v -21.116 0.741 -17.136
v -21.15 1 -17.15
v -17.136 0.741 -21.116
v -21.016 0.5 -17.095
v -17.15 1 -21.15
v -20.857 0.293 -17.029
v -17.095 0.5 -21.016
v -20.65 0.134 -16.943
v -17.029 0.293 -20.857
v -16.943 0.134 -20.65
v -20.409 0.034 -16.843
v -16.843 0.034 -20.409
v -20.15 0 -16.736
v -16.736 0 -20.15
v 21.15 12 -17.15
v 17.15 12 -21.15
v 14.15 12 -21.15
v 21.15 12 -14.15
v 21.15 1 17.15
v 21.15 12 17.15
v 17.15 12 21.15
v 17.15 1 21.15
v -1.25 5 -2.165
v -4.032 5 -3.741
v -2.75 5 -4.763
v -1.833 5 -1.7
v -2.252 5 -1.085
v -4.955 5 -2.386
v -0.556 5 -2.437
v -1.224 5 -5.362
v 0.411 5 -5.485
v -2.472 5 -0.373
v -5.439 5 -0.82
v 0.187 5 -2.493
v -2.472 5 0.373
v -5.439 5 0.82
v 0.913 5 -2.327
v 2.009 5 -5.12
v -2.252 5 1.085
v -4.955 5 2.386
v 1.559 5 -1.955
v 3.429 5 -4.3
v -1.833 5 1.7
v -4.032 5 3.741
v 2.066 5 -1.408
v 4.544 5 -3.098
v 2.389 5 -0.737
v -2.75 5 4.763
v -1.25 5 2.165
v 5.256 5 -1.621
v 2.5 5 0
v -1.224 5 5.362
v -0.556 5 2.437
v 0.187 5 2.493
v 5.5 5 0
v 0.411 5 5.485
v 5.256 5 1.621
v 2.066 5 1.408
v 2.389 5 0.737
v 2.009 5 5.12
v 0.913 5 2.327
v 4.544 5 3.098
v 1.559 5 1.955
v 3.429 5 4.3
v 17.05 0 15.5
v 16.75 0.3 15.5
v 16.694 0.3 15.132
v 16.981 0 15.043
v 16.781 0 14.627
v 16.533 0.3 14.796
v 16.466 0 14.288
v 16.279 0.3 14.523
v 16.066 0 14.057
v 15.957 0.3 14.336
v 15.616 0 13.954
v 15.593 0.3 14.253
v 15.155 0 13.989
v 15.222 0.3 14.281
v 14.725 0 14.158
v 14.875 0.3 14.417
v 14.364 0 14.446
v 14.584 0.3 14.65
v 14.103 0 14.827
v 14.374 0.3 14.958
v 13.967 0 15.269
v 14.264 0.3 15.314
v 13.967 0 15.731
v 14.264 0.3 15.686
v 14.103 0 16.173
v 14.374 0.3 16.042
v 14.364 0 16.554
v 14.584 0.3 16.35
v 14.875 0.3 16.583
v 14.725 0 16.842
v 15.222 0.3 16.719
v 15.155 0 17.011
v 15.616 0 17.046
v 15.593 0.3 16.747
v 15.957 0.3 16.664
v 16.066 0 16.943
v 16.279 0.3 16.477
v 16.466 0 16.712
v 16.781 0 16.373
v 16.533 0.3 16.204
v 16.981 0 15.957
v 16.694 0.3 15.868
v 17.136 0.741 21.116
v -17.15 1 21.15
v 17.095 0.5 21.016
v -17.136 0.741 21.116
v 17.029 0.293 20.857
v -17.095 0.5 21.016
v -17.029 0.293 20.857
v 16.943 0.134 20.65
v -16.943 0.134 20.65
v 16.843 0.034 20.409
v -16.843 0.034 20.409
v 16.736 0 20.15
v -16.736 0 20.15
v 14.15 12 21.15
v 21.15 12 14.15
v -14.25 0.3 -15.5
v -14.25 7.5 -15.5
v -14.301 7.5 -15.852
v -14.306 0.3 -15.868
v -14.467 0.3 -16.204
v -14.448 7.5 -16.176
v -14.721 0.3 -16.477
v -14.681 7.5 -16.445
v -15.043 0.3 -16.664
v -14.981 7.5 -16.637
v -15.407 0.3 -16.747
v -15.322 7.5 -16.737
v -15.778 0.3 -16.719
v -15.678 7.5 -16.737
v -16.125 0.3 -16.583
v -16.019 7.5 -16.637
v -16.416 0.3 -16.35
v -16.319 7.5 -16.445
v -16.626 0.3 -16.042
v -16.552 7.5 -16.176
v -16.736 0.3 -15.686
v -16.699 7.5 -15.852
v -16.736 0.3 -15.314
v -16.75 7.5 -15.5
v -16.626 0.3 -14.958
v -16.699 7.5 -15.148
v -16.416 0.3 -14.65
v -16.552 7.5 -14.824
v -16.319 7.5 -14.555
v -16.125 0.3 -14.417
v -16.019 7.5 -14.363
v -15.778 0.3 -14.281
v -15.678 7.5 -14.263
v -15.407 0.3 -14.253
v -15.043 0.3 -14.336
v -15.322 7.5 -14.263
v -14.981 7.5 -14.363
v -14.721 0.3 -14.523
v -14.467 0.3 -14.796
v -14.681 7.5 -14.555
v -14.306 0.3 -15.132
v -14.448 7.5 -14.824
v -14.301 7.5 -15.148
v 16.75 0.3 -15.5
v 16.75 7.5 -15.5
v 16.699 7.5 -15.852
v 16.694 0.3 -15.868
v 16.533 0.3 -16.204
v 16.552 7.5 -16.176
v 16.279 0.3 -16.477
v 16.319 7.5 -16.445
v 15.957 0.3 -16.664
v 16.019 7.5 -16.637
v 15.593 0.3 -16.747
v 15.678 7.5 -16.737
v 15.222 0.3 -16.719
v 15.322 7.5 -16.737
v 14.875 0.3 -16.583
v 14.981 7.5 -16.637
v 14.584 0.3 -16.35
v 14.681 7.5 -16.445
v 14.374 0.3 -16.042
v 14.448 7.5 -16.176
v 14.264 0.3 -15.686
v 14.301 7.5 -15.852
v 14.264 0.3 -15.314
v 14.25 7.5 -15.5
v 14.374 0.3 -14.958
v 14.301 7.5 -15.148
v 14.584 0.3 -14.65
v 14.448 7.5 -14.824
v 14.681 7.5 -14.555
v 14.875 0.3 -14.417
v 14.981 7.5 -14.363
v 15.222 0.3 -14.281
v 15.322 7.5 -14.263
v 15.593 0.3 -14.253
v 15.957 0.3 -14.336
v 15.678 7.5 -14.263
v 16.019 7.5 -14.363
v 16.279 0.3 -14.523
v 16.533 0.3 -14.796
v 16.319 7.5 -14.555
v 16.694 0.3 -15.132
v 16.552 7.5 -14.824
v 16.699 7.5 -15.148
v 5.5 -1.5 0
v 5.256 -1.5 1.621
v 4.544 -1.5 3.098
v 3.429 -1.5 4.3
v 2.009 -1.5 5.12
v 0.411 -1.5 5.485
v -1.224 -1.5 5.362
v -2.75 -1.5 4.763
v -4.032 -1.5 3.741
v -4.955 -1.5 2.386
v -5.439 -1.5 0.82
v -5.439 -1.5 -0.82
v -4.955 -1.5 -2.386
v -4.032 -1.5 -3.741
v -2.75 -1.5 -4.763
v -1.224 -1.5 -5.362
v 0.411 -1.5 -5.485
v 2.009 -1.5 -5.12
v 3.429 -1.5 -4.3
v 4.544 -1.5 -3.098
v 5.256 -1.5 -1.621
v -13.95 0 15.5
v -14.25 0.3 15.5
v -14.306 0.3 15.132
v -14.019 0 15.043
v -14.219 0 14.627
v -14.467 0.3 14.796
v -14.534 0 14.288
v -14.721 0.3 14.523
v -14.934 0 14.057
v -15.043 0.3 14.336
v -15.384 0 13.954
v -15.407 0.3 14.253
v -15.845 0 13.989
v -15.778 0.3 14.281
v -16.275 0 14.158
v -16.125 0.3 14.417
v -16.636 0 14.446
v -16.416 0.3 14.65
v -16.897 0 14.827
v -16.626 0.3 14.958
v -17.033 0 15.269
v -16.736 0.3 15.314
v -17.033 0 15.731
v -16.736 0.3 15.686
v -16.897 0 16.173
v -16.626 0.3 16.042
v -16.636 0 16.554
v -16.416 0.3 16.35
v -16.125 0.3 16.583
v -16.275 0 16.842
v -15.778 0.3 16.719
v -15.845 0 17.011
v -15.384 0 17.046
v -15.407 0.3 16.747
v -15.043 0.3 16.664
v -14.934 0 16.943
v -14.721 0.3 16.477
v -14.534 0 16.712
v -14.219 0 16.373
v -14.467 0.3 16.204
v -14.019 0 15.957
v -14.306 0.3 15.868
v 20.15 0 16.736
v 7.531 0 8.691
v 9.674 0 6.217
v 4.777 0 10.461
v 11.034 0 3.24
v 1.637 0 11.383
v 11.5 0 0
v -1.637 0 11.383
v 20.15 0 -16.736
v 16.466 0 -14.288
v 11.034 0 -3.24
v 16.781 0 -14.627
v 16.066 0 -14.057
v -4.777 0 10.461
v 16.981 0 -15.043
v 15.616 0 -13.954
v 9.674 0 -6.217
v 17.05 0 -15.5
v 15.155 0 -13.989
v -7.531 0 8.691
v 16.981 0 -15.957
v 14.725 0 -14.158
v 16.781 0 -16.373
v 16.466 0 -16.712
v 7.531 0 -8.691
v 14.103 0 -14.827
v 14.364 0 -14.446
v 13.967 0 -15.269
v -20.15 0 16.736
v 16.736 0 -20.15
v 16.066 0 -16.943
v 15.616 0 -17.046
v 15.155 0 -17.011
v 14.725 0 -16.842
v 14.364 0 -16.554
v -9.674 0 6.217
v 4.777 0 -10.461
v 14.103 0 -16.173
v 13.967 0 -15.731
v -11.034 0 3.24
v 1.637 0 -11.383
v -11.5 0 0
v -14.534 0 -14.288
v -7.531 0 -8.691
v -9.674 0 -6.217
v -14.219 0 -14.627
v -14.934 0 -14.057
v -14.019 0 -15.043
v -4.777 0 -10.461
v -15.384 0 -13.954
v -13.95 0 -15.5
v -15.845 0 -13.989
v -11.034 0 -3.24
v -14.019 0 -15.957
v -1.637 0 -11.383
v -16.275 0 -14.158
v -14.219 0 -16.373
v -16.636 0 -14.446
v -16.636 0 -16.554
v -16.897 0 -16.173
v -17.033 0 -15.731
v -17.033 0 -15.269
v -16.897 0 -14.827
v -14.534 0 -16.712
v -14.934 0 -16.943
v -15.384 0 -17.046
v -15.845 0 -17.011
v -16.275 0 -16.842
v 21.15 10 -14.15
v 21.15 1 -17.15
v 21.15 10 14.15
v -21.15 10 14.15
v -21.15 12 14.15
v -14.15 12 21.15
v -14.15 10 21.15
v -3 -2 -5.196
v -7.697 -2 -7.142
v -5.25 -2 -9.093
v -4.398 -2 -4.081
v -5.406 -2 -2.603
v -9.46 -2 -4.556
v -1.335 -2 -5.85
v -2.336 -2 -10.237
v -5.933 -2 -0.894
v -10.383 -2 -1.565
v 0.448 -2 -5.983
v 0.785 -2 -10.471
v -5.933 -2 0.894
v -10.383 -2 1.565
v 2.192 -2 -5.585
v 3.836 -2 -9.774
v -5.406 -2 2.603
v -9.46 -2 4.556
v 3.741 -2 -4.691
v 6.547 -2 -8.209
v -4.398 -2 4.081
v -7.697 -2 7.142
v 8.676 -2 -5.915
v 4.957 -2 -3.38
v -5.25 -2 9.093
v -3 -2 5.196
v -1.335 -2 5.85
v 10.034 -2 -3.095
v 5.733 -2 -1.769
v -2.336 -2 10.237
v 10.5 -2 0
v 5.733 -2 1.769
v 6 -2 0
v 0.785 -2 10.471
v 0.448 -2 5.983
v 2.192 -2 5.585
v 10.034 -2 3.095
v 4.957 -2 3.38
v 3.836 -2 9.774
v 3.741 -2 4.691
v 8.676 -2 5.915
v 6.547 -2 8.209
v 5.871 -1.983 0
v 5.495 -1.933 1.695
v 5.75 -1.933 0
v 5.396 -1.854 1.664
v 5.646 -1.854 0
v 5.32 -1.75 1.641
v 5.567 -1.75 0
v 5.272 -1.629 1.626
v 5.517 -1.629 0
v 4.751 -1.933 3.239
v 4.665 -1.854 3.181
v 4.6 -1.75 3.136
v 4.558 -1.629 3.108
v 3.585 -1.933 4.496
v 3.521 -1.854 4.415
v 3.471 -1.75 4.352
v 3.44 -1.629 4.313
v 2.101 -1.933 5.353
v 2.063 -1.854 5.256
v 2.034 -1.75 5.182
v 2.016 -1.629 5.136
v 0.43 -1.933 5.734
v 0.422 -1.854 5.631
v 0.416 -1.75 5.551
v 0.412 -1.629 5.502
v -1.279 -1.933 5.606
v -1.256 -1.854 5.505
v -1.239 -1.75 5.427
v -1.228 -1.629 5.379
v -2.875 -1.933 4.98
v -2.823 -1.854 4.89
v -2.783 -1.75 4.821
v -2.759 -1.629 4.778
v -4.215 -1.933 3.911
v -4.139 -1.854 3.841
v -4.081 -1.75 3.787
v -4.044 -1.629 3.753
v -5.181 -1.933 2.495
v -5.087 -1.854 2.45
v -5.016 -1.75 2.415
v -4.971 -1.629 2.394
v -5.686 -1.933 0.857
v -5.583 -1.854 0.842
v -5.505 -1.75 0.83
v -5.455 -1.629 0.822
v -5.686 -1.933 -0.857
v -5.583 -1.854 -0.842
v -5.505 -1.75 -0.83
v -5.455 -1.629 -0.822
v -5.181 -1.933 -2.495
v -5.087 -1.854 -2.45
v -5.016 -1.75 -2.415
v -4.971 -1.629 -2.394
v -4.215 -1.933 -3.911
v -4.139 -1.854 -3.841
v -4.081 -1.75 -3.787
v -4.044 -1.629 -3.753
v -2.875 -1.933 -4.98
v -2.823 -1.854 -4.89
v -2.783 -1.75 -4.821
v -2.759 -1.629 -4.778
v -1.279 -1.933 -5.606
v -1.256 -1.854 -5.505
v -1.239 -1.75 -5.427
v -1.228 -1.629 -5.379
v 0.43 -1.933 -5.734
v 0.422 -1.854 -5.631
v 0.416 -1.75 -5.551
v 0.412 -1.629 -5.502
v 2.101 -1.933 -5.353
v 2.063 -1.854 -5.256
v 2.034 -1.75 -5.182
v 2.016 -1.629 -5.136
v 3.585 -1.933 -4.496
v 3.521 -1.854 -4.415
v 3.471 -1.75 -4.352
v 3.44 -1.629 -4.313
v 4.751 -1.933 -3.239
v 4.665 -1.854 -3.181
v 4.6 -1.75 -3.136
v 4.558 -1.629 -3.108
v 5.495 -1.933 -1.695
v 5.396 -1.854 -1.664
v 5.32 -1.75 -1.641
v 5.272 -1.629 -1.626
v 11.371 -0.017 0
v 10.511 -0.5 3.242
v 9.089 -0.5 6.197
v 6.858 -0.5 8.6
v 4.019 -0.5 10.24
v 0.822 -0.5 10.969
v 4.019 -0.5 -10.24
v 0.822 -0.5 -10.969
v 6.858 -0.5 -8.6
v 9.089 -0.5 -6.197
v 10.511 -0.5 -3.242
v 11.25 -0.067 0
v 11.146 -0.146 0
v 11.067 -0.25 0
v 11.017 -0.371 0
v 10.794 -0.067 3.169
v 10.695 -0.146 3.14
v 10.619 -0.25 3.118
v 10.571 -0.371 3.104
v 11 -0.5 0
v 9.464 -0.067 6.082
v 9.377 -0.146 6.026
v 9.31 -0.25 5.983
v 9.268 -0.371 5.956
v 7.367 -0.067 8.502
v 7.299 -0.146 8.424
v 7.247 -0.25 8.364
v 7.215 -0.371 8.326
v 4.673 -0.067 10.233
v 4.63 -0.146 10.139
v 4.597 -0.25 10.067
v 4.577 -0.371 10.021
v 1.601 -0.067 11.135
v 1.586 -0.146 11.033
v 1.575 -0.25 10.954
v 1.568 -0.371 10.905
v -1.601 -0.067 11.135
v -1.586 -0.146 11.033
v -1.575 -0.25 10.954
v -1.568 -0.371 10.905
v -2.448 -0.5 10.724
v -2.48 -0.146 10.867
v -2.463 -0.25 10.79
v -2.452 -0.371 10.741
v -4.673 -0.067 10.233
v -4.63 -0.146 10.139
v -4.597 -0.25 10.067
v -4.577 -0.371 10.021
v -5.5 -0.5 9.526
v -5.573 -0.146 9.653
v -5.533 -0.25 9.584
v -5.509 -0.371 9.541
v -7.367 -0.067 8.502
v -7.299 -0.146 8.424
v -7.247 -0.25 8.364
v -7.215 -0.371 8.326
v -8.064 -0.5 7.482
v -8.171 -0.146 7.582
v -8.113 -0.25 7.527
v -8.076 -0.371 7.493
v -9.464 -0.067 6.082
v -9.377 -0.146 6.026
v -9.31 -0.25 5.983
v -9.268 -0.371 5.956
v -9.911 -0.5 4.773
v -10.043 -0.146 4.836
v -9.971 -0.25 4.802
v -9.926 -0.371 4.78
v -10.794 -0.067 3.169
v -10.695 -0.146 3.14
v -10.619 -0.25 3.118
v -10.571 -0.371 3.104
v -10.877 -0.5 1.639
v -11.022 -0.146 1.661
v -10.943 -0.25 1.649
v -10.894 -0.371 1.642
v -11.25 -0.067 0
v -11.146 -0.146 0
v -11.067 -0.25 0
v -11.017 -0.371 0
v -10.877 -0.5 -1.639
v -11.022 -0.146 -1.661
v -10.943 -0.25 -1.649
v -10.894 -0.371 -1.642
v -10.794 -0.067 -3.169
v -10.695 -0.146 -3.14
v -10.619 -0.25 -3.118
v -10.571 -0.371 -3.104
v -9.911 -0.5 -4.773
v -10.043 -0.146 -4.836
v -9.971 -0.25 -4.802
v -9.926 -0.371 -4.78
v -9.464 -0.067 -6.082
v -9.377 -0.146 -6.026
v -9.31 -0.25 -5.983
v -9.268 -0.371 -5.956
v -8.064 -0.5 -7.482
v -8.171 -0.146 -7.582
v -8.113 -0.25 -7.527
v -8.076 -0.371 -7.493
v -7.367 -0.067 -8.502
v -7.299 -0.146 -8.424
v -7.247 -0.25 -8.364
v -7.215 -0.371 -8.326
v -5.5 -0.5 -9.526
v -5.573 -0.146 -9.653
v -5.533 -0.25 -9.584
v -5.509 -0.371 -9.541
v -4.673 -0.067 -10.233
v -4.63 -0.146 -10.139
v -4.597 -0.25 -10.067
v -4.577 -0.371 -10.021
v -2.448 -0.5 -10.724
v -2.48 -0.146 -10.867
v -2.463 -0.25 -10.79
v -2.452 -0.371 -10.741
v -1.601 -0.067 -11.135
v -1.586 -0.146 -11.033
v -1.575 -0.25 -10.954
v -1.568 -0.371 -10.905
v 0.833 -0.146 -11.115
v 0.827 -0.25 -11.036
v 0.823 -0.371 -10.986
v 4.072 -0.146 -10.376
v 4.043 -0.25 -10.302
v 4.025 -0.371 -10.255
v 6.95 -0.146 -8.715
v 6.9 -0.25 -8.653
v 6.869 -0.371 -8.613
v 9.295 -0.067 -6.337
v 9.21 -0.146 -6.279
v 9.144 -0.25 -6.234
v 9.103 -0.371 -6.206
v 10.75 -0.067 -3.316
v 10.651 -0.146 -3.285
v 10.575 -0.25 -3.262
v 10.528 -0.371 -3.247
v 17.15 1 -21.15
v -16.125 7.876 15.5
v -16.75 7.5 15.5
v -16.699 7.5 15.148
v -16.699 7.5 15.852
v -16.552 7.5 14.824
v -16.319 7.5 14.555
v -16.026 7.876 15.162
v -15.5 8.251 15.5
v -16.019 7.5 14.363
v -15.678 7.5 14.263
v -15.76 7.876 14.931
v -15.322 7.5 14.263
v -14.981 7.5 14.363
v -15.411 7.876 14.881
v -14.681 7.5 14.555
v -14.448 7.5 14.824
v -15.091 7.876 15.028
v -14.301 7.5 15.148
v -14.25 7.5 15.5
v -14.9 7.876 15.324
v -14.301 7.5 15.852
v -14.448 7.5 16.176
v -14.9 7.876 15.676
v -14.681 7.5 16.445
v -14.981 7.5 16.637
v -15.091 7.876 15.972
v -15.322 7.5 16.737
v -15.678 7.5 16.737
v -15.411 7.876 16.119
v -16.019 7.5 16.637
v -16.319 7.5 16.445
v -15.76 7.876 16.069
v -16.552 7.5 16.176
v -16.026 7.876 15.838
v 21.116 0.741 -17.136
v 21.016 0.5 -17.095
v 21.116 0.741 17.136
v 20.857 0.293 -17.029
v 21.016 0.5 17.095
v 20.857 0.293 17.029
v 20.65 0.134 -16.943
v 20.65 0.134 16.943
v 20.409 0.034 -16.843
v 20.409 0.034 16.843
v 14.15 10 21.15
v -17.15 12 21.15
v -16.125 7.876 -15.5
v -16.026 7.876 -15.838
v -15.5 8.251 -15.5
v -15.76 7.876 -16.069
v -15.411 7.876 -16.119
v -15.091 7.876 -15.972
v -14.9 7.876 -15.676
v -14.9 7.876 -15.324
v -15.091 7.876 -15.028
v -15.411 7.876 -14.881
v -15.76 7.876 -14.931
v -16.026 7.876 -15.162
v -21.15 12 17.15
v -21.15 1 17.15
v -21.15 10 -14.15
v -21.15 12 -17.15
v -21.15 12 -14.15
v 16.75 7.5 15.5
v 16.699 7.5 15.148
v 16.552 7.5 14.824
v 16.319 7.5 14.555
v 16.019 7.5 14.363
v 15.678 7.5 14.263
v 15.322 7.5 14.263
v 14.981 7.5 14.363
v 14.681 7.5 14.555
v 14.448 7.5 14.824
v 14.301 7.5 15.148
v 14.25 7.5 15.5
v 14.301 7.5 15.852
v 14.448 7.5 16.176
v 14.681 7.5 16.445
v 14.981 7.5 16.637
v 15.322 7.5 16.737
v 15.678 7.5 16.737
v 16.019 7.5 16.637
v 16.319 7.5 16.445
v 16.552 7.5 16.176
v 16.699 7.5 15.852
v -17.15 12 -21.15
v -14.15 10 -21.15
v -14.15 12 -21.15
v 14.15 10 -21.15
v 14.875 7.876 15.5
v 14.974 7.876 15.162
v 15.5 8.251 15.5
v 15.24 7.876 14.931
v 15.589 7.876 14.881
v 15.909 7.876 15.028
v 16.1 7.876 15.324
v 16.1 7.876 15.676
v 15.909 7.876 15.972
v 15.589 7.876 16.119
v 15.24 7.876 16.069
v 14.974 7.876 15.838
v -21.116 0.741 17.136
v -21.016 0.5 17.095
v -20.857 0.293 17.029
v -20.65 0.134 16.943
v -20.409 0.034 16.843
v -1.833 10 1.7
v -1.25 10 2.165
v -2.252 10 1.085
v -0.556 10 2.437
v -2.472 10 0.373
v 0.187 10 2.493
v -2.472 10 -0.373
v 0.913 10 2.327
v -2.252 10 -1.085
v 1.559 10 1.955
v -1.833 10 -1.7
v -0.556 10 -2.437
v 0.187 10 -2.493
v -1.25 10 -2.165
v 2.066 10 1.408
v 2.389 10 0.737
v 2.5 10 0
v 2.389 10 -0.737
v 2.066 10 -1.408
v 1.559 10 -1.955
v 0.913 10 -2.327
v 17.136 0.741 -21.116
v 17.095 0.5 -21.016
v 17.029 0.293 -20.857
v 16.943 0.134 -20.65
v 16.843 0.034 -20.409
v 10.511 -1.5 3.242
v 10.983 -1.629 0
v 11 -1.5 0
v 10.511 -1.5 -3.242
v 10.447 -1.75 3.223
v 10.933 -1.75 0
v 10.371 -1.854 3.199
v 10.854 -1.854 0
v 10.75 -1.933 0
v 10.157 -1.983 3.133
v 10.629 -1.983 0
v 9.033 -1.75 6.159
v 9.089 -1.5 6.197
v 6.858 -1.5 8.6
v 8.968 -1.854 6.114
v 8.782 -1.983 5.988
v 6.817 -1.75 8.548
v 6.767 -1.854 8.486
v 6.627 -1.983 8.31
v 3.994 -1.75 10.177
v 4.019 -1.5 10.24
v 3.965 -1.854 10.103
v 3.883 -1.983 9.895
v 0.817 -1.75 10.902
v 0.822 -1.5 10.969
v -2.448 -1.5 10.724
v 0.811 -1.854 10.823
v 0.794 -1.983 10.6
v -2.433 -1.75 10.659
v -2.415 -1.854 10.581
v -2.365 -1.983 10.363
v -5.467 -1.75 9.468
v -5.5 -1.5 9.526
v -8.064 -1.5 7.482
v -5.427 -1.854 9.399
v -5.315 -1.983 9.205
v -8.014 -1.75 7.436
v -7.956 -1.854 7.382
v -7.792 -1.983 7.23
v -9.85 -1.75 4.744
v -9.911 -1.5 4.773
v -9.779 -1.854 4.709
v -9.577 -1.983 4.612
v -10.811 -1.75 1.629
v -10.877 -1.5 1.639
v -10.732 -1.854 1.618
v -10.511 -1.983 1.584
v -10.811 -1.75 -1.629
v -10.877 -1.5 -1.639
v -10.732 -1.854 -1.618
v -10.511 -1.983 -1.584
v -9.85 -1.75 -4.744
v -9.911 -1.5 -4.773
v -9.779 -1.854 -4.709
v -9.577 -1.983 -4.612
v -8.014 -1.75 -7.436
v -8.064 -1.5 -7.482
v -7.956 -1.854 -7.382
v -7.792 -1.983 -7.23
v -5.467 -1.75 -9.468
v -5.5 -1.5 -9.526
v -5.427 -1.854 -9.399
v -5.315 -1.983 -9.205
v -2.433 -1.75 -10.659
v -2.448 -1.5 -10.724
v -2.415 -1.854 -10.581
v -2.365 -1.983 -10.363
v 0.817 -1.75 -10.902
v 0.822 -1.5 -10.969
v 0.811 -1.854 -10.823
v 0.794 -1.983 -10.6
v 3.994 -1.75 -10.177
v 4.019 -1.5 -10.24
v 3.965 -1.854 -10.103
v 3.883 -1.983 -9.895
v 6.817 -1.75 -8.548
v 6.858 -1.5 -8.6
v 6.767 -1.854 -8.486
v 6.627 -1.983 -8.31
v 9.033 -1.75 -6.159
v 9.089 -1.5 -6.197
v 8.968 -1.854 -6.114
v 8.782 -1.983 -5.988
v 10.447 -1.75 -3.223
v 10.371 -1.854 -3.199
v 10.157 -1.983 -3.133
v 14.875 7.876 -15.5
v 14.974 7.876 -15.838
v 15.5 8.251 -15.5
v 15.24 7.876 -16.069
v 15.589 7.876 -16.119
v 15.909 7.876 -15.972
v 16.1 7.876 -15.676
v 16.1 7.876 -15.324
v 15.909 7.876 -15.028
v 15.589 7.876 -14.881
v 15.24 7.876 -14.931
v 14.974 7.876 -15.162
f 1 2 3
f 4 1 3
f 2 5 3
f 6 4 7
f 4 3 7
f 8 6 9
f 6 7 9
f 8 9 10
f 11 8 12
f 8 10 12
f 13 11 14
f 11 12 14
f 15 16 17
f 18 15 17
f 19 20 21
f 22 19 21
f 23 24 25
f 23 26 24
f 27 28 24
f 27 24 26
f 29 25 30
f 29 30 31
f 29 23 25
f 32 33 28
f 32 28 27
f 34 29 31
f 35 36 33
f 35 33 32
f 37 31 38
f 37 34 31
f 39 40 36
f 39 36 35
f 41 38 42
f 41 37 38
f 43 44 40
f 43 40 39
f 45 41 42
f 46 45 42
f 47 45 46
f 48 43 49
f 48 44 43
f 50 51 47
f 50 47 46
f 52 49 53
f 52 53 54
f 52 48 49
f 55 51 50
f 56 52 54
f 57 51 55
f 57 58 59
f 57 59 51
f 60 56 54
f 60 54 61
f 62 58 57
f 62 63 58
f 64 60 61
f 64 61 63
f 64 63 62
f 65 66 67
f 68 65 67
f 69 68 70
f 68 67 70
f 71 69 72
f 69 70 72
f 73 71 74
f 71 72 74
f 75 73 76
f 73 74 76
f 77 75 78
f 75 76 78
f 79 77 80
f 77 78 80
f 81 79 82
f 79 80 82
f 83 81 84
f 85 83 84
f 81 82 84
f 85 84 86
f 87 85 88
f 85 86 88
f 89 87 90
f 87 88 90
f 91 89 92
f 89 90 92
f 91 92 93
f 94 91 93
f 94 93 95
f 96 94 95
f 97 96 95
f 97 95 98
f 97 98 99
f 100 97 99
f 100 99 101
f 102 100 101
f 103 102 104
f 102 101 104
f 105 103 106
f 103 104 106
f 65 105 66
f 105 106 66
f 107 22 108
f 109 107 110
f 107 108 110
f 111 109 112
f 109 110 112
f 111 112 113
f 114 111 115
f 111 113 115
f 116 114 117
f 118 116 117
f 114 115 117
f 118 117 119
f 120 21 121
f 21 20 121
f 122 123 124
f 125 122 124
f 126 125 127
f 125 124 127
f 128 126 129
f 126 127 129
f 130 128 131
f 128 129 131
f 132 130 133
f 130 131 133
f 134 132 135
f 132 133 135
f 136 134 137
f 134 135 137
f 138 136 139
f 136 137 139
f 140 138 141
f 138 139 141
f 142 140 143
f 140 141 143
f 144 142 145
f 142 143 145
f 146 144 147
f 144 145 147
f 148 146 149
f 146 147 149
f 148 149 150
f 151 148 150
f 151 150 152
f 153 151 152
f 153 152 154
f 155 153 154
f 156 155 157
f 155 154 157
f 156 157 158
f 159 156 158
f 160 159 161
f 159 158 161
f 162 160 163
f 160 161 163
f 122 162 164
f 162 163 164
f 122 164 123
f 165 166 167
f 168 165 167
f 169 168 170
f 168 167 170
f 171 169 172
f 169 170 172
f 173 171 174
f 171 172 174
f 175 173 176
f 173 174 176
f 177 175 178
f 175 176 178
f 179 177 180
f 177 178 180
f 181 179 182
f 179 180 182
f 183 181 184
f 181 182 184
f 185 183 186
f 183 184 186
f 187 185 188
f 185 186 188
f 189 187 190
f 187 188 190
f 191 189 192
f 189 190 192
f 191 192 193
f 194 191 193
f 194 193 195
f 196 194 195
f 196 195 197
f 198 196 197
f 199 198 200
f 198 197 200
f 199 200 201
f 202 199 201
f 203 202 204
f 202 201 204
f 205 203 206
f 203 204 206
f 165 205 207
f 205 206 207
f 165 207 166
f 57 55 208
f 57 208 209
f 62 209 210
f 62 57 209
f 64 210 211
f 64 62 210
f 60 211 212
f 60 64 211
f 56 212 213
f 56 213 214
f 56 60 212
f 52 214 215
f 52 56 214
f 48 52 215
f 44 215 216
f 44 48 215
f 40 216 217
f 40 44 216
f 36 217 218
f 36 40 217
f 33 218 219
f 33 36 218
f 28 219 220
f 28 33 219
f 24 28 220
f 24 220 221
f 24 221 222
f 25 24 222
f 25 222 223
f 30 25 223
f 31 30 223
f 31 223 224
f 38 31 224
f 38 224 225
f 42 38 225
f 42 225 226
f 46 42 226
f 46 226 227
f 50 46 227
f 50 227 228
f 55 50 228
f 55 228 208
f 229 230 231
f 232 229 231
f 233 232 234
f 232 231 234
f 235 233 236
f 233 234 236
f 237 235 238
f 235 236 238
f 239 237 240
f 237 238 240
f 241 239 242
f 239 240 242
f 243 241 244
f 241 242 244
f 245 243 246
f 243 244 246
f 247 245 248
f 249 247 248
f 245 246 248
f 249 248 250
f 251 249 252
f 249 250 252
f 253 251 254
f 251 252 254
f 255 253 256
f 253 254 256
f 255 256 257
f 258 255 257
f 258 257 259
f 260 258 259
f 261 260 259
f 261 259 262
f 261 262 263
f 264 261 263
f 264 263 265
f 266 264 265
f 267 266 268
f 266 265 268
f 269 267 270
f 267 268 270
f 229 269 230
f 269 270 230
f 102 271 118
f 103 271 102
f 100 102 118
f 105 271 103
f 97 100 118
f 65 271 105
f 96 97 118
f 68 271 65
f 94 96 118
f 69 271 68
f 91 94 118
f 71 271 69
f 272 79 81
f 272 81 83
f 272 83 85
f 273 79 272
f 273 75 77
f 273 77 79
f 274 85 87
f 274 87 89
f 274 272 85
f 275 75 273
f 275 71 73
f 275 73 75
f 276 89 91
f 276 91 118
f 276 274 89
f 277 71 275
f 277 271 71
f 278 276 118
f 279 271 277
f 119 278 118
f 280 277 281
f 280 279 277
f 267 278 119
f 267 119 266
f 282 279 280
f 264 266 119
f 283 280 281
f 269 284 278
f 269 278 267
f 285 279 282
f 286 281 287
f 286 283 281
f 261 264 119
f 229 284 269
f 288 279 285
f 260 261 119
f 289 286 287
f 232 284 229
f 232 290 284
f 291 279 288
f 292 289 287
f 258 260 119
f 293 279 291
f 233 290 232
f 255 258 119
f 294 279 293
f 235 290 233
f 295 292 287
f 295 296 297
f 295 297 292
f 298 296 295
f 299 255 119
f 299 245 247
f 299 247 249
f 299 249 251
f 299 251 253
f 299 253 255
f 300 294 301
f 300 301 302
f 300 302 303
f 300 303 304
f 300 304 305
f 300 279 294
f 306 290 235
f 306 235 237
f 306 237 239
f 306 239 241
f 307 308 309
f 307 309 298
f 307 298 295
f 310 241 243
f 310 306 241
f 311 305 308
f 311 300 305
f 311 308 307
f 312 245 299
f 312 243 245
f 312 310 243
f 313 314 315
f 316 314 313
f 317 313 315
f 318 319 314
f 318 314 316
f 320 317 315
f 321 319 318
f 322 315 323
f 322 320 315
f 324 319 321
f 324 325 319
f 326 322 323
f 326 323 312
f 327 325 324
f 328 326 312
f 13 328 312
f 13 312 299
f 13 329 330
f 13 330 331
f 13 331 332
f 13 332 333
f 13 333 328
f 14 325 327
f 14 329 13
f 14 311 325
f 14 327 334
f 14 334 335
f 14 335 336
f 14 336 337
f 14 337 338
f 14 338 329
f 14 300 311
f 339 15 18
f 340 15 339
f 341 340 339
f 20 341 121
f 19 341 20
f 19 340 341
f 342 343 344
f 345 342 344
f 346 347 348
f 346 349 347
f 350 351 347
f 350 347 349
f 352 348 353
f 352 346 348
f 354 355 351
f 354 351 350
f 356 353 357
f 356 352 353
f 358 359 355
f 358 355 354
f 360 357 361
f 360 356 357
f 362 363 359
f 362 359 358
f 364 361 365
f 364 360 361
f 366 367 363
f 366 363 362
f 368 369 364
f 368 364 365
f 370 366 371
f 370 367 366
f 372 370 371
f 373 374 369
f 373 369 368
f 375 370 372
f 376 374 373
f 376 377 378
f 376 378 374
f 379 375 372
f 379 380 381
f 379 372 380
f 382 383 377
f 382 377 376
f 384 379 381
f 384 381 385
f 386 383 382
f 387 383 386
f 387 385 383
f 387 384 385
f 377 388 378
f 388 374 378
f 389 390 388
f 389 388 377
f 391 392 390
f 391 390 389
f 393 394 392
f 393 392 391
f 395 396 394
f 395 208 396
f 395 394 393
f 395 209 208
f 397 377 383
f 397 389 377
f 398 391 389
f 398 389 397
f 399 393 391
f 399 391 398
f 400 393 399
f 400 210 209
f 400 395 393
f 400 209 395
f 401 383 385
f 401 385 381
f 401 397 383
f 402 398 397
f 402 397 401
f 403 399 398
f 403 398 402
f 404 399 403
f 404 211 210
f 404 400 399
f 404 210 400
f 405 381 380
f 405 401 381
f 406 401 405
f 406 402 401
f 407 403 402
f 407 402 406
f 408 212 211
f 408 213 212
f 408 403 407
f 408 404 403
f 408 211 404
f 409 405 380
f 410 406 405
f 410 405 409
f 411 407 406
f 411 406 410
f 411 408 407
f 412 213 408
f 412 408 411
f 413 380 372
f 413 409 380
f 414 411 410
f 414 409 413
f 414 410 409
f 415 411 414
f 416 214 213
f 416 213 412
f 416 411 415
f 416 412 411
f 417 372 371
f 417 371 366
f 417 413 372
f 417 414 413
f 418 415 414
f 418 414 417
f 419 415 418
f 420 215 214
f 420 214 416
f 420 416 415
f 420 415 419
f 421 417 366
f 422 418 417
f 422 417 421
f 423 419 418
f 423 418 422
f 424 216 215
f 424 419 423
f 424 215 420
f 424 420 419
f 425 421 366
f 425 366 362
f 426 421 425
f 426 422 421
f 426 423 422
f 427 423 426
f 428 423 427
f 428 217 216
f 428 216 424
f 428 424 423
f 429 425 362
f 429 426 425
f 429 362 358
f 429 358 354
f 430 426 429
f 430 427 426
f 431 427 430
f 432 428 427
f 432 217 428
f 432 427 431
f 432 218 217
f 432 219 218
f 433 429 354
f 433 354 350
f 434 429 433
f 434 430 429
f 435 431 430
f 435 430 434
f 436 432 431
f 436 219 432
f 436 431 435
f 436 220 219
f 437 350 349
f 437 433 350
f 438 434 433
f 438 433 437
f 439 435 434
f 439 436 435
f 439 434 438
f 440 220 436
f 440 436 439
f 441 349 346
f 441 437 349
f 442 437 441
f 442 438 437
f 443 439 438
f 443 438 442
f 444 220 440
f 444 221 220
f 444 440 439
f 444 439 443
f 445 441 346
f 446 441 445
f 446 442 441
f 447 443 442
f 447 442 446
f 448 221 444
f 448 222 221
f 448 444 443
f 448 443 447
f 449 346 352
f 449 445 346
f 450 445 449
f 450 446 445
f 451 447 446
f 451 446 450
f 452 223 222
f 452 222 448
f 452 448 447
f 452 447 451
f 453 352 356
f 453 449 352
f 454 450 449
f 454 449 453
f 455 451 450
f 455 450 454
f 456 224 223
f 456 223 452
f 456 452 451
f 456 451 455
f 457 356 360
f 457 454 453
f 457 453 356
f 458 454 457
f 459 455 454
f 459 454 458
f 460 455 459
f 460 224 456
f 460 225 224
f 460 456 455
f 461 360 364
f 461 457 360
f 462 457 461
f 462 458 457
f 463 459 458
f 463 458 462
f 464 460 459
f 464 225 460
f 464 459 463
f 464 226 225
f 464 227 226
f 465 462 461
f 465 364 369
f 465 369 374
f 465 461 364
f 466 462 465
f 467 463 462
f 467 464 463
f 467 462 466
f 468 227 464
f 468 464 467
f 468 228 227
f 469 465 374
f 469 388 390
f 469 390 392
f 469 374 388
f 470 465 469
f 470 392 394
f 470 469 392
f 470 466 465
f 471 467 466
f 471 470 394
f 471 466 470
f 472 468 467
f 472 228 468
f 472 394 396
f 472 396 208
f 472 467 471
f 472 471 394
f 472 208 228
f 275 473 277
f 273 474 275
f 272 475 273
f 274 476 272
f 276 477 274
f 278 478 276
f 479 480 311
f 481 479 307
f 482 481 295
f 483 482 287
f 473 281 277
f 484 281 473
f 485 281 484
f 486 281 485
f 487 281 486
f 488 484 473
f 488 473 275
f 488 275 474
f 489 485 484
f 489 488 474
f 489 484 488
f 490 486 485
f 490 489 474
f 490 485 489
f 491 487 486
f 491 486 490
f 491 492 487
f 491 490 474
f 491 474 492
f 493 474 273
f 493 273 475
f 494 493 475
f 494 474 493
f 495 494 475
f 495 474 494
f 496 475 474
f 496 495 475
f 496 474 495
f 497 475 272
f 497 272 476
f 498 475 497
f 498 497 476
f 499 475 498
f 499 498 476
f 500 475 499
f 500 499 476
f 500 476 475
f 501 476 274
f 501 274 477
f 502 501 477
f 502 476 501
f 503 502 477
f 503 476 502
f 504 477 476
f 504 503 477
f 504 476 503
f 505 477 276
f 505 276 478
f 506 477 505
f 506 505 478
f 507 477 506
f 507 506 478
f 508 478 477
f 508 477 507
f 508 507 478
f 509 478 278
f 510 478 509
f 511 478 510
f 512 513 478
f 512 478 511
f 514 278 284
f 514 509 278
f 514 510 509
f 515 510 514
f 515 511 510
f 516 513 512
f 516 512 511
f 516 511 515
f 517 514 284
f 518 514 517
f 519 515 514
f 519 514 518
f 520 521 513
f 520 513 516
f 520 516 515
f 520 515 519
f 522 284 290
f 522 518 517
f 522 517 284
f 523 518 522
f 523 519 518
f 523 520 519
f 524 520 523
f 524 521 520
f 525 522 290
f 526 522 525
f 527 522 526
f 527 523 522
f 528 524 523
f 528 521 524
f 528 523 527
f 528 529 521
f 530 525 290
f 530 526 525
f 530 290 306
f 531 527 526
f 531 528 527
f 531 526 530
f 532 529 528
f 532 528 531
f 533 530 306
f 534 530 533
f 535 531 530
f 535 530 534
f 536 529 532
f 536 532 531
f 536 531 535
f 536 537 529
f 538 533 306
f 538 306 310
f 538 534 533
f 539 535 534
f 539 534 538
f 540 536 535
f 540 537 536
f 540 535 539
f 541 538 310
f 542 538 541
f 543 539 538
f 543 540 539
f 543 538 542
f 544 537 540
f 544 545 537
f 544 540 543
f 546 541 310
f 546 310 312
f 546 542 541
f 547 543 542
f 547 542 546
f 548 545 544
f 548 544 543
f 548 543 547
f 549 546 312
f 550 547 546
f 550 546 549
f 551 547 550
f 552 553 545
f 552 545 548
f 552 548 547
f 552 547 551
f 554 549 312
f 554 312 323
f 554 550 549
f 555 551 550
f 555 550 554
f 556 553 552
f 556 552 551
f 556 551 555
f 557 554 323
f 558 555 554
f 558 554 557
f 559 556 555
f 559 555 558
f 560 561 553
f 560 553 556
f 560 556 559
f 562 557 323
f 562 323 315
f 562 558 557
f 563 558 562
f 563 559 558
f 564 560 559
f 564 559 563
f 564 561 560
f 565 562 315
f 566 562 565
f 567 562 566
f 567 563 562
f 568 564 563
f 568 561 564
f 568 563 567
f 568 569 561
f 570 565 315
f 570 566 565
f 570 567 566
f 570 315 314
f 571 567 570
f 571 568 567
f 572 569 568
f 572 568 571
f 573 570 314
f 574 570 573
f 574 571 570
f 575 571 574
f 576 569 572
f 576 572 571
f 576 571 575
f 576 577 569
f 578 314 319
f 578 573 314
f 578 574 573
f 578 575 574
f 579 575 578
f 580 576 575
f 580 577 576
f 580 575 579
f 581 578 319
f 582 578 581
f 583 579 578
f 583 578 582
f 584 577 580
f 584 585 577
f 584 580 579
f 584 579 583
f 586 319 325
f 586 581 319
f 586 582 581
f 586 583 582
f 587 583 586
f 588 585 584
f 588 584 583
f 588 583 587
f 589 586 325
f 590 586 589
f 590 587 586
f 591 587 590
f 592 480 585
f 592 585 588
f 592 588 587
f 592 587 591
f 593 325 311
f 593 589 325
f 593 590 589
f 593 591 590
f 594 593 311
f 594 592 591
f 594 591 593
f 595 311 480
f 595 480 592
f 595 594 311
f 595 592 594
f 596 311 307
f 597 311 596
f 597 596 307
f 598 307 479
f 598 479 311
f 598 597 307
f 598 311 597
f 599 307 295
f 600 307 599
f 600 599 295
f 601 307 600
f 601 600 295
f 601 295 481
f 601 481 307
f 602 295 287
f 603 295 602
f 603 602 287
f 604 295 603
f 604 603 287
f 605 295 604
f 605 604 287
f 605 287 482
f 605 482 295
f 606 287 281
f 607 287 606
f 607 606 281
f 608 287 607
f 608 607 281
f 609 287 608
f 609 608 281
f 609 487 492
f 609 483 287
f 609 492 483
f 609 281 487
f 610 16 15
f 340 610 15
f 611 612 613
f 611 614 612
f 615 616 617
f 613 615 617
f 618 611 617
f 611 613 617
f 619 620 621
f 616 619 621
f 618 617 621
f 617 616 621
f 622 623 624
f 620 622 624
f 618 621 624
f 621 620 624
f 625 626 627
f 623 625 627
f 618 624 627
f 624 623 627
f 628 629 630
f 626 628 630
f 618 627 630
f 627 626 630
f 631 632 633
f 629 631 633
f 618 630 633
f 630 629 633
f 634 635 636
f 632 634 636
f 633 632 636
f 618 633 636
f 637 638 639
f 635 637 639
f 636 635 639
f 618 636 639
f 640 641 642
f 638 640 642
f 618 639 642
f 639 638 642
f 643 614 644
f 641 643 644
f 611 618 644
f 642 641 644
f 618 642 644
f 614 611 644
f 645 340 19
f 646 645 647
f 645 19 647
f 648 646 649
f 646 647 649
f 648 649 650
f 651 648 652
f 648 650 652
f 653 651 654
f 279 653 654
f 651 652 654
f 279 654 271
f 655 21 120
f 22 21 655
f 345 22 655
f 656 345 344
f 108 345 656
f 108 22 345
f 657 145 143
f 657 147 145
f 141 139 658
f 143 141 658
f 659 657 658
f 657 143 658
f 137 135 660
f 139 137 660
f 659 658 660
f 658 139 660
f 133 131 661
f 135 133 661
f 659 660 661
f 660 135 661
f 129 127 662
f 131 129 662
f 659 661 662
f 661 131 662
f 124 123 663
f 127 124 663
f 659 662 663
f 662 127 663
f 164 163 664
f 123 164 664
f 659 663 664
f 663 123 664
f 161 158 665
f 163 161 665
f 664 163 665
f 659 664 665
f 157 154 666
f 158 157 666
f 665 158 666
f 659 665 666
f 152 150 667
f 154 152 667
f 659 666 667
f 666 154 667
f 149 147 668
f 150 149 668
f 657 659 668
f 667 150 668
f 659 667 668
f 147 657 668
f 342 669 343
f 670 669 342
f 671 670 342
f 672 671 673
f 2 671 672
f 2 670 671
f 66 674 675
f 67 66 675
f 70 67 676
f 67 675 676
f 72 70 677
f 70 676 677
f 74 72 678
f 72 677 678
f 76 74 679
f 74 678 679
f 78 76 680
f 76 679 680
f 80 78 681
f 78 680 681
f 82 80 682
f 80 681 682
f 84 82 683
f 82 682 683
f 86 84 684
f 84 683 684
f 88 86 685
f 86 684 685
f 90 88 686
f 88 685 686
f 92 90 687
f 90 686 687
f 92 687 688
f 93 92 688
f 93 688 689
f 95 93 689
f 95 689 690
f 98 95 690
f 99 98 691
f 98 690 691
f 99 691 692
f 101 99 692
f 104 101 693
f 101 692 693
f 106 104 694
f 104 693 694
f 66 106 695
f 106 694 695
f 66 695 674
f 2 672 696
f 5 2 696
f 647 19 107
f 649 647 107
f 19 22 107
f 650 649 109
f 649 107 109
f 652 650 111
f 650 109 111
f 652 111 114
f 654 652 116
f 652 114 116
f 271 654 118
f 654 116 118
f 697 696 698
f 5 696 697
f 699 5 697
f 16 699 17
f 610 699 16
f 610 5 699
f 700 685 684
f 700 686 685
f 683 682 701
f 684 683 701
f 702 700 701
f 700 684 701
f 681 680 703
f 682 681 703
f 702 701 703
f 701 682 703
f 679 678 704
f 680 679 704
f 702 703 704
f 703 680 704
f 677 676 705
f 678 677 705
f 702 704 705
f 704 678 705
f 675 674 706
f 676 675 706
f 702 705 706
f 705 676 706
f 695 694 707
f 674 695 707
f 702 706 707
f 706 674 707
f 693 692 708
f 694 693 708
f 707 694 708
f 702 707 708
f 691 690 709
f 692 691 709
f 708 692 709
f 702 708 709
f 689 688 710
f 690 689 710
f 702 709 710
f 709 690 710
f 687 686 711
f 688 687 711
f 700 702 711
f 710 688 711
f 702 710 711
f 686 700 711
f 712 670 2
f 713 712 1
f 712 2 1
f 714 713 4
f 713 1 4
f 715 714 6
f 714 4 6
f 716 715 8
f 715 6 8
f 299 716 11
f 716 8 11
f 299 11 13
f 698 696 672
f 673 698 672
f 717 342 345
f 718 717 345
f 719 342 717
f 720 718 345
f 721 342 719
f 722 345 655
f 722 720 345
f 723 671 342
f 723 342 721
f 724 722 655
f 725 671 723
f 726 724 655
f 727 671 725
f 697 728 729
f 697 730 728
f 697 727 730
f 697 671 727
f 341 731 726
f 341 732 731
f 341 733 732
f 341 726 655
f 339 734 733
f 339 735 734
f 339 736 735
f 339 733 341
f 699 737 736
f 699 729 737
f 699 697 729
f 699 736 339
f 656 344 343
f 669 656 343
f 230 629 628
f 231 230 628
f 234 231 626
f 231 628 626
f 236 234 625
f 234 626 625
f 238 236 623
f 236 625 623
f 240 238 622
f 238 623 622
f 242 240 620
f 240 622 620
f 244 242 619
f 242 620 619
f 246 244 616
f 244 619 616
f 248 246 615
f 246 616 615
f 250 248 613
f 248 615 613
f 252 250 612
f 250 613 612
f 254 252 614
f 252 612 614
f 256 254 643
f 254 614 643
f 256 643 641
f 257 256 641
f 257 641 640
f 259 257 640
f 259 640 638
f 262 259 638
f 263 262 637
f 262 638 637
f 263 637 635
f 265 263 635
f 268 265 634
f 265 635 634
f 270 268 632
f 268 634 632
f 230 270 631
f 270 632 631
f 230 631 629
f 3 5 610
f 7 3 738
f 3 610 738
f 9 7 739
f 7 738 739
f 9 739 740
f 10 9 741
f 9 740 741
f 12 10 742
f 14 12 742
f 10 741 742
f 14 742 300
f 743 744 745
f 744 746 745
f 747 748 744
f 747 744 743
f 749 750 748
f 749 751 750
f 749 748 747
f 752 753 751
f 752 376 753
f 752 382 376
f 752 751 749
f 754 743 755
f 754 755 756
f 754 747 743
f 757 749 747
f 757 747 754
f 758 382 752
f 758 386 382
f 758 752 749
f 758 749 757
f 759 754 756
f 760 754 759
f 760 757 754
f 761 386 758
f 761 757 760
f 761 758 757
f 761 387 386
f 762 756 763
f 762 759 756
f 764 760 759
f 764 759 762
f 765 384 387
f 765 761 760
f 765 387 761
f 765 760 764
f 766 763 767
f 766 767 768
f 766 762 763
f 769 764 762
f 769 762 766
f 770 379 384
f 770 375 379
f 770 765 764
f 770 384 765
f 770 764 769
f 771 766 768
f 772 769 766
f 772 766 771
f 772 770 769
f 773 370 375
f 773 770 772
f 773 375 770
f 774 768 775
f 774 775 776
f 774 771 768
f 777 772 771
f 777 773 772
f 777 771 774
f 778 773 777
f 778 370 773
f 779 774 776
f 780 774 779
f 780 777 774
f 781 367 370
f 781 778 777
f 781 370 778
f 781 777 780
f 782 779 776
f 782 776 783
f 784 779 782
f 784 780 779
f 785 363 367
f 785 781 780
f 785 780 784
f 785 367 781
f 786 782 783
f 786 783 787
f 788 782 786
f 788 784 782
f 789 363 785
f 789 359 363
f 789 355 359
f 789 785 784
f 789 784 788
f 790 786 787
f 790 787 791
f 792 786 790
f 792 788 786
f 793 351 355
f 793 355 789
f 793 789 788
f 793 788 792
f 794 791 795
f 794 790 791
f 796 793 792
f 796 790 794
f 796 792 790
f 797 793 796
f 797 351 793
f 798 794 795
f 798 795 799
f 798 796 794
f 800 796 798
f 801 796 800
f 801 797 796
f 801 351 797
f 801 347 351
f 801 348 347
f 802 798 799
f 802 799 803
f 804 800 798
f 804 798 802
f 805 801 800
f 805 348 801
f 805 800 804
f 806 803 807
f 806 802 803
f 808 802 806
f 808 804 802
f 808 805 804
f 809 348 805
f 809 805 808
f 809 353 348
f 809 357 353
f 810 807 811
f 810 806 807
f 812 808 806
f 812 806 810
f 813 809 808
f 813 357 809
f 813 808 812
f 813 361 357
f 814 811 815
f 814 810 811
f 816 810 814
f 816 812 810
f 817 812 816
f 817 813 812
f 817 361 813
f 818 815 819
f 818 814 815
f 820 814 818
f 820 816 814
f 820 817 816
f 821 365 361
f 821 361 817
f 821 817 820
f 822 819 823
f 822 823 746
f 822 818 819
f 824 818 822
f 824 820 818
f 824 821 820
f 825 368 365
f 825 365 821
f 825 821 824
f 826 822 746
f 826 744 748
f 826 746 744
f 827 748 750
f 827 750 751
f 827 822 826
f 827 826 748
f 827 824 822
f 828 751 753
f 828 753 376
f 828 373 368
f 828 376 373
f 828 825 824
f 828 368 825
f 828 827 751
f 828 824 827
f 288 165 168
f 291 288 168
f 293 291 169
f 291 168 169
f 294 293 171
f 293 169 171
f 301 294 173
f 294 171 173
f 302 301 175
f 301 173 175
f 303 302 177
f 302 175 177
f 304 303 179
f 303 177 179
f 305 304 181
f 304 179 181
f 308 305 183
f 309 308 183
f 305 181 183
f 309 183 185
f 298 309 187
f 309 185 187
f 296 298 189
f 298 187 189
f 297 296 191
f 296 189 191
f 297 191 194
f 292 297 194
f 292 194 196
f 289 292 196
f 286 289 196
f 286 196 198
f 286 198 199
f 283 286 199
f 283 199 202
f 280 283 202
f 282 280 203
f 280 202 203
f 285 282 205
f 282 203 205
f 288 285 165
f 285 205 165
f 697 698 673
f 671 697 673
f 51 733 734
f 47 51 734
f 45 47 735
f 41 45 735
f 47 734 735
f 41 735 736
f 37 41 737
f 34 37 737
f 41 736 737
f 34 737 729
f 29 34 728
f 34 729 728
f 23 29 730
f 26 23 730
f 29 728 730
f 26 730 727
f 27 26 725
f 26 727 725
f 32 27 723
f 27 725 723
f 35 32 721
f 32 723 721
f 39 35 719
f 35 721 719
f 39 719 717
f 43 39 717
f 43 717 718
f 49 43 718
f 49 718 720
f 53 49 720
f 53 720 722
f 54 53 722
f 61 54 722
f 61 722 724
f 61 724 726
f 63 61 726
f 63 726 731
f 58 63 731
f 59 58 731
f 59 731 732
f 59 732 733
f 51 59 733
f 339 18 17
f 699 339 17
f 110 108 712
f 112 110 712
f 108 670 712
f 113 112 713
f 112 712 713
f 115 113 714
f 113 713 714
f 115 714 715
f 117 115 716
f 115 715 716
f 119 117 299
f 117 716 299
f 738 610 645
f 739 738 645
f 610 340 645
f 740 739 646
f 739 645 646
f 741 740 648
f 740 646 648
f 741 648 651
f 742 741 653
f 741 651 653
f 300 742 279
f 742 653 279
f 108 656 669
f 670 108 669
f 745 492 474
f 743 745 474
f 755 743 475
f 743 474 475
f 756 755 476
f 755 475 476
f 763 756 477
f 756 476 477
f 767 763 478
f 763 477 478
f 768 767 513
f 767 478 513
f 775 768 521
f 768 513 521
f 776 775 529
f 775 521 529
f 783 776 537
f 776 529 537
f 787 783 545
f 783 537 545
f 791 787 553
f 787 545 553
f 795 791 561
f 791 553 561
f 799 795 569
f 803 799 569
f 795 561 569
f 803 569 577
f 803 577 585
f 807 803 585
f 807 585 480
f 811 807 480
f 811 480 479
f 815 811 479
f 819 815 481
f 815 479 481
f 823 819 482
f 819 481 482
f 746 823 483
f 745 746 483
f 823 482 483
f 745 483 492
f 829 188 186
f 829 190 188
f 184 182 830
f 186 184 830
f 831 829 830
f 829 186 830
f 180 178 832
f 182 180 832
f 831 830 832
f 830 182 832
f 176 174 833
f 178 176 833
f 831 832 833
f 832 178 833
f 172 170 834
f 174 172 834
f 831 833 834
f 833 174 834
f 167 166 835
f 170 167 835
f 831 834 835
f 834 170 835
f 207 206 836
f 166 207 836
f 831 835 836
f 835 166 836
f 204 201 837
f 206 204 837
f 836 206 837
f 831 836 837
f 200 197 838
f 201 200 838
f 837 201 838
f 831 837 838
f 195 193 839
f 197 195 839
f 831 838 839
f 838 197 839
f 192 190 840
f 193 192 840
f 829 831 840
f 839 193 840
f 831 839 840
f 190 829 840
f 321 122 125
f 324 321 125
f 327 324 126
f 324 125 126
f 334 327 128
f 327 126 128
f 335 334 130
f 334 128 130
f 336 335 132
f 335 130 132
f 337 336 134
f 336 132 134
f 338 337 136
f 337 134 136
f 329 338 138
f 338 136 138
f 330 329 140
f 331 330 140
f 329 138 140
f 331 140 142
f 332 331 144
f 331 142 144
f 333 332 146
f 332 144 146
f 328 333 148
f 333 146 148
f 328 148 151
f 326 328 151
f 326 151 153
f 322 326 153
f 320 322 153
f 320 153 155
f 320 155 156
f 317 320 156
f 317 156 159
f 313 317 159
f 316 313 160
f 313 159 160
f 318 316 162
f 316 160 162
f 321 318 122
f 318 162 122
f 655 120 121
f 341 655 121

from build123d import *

# Parameters (mm, degrees)
BOSS_EXTRUDE3_DEPTH   = 12
CUT_EXTRUDE5_DEPTH    = 2
SKETCH12_R            = 2.5
CUT_EXTRUDE6_DEPTH    = 11
SKETCH13_R            = 5.5
CUT_EXTRUDE7_DEPTH    = 5
SKETCH16_R            = 11
SKETCH16_R_2          = 5.5
BOSS_EXTRUDE4_DEPTH   = 2
FILLET3_R             = 1
FILLET4_R             = 0.5
M3_TAPPED_HOLE1_D     = 2.5
M3_TAPPED_HOLE1_DEPTH = 7.5
M3_TAPPED_HOLE1_TIP   = 0.751075774
CHAMFER1_SIZE         = 0.3


with BuildPart() as part:
    # Sketch10 → Boss-Extrude3 (new body)
    with BuildSketch(Plane(origin=(0, 0, 0), x_dir=(1, 0, 0), z_dir=(0, 1, 0))):
        Polygon((-21.15, 17.15), (-17.15, 21.15), (17.15, 21.15), (21.15, 17.15), (21.15, -17.15), (17.15, -21.15), (-17.15, -21.15), (-21.15, -17.15), align=None)
    extrude(amount=BOSS_EXTRUDE3_DEPTH)

    # Sketch11 → Cut-Extrude5 (cut)
    with BuildSketch(Plane(origin=(0, 12, 0), x_dir=(1, 0, 0), z_dir=(0, 1, 0))):
        Polygon((-14.15, -21.15), (14.15, -21.15), (21.15, -14.15), (21.15, 14.15), (14.15, 21.15), (-14.15, 21.15), (-21.15, 14.15), (-21.15, -14.15), align=None)
    extrude(amount=-CUT_EXTRUDE5_DEPTH, mode=Mode.SUBTRACT)

    # Sketch12 → Cut-Extrude6 (cut, through all)
    with BuildSketch(Plane(origin=(0, 10, 0), x_dir=(1, 0, 0), z_dir=(0, 1, 0))):
        Circle(SKETCH12_R)
    extrude(amount=-CUT_EXTRUDE6_DEPTH, mode=Mode.SUBTRACT)

    # Sketch13 → Cut-Extrude7 (cut)
    with BuildSketch(Plane.XZ):
        Circle(SKETCH13_R)
    extrude(amount=-CUT_EXTRUDE7_DEPTH, mode=Mode.SUBTRACT)

    # Sketch16 → Boss-Extrude4 (add)
    with BuildSketch(Plane.XZ):
        Circle(SKETCH16_R)
        Circle(SKETCH16_R_2, mode=Mode.SUBTRACT)
    extrude(amount=BOSS_EXTRUDE4_DEPTH)

    # Fillet3
    fillet3_edges = [part.edges().sort_by_distance(p)[0] for p in [
        (-19.15, 0, -19.15),
        (0, 0, -21.15),
        (19.15, 0, -19.15),
        (21.15, 0, 0),
        (19.15, 0, 19.15),
        (0, 0, 21.15),
        (-19.15, 0, 19.15),
        (-21.15, 0, 0),
    ]]
    fillet(fillet3_edges, radius=FILLET3_R)

    # Fillet4
    fillet4_edges = [part.edges().sort_by_distance(p)[0] for p in [
        (-11, 0, 0),
        (-11, -2, 0),
        (-5.5, -2, 0),
    ]]
    fillet(fillet4_edges, radius=FILLET4_R)

    # M3 Tapped Hole1
    with Locations(Plane(origin=(0, 0, 0), x_dir=(-1, 0, 0), z_dir=(0, -1, 0))):
        with Locations((-15.5, -15.5), (15.5, -15.5), (15.5, 15.5), (-15.5, 15.5)):
            Hole(M3_TAPPED_HOLE1_D / 2, depth=M3_TAPPED_HOLE1_DEPTH)
            with Locations((0, 0, -(M3_TAPPED_HOLE1_DEPTH + M3_TAPPED_HOLE1_TIP / 2))):  # 118° drill point
                Cone(0, M3_TAPPED_HOLE1_D / 2, M3_TAPPED_HOLE1_TIP, mode=Mode.SUBTRACT)

    # Chamfer1
    chamfer1_edges = [part.edges().sort_by_distance(p)[0] for p in [
        (14.25, 0, -15.5),
        (-16.75, 0, -15.5),
        (-16.75, 0, 15.5),
        (14.25, 0, 15.5),
    ]]
    chamfer(chamfer1_edges, length=CHAMFER1_SIZE)


solid = part.part
